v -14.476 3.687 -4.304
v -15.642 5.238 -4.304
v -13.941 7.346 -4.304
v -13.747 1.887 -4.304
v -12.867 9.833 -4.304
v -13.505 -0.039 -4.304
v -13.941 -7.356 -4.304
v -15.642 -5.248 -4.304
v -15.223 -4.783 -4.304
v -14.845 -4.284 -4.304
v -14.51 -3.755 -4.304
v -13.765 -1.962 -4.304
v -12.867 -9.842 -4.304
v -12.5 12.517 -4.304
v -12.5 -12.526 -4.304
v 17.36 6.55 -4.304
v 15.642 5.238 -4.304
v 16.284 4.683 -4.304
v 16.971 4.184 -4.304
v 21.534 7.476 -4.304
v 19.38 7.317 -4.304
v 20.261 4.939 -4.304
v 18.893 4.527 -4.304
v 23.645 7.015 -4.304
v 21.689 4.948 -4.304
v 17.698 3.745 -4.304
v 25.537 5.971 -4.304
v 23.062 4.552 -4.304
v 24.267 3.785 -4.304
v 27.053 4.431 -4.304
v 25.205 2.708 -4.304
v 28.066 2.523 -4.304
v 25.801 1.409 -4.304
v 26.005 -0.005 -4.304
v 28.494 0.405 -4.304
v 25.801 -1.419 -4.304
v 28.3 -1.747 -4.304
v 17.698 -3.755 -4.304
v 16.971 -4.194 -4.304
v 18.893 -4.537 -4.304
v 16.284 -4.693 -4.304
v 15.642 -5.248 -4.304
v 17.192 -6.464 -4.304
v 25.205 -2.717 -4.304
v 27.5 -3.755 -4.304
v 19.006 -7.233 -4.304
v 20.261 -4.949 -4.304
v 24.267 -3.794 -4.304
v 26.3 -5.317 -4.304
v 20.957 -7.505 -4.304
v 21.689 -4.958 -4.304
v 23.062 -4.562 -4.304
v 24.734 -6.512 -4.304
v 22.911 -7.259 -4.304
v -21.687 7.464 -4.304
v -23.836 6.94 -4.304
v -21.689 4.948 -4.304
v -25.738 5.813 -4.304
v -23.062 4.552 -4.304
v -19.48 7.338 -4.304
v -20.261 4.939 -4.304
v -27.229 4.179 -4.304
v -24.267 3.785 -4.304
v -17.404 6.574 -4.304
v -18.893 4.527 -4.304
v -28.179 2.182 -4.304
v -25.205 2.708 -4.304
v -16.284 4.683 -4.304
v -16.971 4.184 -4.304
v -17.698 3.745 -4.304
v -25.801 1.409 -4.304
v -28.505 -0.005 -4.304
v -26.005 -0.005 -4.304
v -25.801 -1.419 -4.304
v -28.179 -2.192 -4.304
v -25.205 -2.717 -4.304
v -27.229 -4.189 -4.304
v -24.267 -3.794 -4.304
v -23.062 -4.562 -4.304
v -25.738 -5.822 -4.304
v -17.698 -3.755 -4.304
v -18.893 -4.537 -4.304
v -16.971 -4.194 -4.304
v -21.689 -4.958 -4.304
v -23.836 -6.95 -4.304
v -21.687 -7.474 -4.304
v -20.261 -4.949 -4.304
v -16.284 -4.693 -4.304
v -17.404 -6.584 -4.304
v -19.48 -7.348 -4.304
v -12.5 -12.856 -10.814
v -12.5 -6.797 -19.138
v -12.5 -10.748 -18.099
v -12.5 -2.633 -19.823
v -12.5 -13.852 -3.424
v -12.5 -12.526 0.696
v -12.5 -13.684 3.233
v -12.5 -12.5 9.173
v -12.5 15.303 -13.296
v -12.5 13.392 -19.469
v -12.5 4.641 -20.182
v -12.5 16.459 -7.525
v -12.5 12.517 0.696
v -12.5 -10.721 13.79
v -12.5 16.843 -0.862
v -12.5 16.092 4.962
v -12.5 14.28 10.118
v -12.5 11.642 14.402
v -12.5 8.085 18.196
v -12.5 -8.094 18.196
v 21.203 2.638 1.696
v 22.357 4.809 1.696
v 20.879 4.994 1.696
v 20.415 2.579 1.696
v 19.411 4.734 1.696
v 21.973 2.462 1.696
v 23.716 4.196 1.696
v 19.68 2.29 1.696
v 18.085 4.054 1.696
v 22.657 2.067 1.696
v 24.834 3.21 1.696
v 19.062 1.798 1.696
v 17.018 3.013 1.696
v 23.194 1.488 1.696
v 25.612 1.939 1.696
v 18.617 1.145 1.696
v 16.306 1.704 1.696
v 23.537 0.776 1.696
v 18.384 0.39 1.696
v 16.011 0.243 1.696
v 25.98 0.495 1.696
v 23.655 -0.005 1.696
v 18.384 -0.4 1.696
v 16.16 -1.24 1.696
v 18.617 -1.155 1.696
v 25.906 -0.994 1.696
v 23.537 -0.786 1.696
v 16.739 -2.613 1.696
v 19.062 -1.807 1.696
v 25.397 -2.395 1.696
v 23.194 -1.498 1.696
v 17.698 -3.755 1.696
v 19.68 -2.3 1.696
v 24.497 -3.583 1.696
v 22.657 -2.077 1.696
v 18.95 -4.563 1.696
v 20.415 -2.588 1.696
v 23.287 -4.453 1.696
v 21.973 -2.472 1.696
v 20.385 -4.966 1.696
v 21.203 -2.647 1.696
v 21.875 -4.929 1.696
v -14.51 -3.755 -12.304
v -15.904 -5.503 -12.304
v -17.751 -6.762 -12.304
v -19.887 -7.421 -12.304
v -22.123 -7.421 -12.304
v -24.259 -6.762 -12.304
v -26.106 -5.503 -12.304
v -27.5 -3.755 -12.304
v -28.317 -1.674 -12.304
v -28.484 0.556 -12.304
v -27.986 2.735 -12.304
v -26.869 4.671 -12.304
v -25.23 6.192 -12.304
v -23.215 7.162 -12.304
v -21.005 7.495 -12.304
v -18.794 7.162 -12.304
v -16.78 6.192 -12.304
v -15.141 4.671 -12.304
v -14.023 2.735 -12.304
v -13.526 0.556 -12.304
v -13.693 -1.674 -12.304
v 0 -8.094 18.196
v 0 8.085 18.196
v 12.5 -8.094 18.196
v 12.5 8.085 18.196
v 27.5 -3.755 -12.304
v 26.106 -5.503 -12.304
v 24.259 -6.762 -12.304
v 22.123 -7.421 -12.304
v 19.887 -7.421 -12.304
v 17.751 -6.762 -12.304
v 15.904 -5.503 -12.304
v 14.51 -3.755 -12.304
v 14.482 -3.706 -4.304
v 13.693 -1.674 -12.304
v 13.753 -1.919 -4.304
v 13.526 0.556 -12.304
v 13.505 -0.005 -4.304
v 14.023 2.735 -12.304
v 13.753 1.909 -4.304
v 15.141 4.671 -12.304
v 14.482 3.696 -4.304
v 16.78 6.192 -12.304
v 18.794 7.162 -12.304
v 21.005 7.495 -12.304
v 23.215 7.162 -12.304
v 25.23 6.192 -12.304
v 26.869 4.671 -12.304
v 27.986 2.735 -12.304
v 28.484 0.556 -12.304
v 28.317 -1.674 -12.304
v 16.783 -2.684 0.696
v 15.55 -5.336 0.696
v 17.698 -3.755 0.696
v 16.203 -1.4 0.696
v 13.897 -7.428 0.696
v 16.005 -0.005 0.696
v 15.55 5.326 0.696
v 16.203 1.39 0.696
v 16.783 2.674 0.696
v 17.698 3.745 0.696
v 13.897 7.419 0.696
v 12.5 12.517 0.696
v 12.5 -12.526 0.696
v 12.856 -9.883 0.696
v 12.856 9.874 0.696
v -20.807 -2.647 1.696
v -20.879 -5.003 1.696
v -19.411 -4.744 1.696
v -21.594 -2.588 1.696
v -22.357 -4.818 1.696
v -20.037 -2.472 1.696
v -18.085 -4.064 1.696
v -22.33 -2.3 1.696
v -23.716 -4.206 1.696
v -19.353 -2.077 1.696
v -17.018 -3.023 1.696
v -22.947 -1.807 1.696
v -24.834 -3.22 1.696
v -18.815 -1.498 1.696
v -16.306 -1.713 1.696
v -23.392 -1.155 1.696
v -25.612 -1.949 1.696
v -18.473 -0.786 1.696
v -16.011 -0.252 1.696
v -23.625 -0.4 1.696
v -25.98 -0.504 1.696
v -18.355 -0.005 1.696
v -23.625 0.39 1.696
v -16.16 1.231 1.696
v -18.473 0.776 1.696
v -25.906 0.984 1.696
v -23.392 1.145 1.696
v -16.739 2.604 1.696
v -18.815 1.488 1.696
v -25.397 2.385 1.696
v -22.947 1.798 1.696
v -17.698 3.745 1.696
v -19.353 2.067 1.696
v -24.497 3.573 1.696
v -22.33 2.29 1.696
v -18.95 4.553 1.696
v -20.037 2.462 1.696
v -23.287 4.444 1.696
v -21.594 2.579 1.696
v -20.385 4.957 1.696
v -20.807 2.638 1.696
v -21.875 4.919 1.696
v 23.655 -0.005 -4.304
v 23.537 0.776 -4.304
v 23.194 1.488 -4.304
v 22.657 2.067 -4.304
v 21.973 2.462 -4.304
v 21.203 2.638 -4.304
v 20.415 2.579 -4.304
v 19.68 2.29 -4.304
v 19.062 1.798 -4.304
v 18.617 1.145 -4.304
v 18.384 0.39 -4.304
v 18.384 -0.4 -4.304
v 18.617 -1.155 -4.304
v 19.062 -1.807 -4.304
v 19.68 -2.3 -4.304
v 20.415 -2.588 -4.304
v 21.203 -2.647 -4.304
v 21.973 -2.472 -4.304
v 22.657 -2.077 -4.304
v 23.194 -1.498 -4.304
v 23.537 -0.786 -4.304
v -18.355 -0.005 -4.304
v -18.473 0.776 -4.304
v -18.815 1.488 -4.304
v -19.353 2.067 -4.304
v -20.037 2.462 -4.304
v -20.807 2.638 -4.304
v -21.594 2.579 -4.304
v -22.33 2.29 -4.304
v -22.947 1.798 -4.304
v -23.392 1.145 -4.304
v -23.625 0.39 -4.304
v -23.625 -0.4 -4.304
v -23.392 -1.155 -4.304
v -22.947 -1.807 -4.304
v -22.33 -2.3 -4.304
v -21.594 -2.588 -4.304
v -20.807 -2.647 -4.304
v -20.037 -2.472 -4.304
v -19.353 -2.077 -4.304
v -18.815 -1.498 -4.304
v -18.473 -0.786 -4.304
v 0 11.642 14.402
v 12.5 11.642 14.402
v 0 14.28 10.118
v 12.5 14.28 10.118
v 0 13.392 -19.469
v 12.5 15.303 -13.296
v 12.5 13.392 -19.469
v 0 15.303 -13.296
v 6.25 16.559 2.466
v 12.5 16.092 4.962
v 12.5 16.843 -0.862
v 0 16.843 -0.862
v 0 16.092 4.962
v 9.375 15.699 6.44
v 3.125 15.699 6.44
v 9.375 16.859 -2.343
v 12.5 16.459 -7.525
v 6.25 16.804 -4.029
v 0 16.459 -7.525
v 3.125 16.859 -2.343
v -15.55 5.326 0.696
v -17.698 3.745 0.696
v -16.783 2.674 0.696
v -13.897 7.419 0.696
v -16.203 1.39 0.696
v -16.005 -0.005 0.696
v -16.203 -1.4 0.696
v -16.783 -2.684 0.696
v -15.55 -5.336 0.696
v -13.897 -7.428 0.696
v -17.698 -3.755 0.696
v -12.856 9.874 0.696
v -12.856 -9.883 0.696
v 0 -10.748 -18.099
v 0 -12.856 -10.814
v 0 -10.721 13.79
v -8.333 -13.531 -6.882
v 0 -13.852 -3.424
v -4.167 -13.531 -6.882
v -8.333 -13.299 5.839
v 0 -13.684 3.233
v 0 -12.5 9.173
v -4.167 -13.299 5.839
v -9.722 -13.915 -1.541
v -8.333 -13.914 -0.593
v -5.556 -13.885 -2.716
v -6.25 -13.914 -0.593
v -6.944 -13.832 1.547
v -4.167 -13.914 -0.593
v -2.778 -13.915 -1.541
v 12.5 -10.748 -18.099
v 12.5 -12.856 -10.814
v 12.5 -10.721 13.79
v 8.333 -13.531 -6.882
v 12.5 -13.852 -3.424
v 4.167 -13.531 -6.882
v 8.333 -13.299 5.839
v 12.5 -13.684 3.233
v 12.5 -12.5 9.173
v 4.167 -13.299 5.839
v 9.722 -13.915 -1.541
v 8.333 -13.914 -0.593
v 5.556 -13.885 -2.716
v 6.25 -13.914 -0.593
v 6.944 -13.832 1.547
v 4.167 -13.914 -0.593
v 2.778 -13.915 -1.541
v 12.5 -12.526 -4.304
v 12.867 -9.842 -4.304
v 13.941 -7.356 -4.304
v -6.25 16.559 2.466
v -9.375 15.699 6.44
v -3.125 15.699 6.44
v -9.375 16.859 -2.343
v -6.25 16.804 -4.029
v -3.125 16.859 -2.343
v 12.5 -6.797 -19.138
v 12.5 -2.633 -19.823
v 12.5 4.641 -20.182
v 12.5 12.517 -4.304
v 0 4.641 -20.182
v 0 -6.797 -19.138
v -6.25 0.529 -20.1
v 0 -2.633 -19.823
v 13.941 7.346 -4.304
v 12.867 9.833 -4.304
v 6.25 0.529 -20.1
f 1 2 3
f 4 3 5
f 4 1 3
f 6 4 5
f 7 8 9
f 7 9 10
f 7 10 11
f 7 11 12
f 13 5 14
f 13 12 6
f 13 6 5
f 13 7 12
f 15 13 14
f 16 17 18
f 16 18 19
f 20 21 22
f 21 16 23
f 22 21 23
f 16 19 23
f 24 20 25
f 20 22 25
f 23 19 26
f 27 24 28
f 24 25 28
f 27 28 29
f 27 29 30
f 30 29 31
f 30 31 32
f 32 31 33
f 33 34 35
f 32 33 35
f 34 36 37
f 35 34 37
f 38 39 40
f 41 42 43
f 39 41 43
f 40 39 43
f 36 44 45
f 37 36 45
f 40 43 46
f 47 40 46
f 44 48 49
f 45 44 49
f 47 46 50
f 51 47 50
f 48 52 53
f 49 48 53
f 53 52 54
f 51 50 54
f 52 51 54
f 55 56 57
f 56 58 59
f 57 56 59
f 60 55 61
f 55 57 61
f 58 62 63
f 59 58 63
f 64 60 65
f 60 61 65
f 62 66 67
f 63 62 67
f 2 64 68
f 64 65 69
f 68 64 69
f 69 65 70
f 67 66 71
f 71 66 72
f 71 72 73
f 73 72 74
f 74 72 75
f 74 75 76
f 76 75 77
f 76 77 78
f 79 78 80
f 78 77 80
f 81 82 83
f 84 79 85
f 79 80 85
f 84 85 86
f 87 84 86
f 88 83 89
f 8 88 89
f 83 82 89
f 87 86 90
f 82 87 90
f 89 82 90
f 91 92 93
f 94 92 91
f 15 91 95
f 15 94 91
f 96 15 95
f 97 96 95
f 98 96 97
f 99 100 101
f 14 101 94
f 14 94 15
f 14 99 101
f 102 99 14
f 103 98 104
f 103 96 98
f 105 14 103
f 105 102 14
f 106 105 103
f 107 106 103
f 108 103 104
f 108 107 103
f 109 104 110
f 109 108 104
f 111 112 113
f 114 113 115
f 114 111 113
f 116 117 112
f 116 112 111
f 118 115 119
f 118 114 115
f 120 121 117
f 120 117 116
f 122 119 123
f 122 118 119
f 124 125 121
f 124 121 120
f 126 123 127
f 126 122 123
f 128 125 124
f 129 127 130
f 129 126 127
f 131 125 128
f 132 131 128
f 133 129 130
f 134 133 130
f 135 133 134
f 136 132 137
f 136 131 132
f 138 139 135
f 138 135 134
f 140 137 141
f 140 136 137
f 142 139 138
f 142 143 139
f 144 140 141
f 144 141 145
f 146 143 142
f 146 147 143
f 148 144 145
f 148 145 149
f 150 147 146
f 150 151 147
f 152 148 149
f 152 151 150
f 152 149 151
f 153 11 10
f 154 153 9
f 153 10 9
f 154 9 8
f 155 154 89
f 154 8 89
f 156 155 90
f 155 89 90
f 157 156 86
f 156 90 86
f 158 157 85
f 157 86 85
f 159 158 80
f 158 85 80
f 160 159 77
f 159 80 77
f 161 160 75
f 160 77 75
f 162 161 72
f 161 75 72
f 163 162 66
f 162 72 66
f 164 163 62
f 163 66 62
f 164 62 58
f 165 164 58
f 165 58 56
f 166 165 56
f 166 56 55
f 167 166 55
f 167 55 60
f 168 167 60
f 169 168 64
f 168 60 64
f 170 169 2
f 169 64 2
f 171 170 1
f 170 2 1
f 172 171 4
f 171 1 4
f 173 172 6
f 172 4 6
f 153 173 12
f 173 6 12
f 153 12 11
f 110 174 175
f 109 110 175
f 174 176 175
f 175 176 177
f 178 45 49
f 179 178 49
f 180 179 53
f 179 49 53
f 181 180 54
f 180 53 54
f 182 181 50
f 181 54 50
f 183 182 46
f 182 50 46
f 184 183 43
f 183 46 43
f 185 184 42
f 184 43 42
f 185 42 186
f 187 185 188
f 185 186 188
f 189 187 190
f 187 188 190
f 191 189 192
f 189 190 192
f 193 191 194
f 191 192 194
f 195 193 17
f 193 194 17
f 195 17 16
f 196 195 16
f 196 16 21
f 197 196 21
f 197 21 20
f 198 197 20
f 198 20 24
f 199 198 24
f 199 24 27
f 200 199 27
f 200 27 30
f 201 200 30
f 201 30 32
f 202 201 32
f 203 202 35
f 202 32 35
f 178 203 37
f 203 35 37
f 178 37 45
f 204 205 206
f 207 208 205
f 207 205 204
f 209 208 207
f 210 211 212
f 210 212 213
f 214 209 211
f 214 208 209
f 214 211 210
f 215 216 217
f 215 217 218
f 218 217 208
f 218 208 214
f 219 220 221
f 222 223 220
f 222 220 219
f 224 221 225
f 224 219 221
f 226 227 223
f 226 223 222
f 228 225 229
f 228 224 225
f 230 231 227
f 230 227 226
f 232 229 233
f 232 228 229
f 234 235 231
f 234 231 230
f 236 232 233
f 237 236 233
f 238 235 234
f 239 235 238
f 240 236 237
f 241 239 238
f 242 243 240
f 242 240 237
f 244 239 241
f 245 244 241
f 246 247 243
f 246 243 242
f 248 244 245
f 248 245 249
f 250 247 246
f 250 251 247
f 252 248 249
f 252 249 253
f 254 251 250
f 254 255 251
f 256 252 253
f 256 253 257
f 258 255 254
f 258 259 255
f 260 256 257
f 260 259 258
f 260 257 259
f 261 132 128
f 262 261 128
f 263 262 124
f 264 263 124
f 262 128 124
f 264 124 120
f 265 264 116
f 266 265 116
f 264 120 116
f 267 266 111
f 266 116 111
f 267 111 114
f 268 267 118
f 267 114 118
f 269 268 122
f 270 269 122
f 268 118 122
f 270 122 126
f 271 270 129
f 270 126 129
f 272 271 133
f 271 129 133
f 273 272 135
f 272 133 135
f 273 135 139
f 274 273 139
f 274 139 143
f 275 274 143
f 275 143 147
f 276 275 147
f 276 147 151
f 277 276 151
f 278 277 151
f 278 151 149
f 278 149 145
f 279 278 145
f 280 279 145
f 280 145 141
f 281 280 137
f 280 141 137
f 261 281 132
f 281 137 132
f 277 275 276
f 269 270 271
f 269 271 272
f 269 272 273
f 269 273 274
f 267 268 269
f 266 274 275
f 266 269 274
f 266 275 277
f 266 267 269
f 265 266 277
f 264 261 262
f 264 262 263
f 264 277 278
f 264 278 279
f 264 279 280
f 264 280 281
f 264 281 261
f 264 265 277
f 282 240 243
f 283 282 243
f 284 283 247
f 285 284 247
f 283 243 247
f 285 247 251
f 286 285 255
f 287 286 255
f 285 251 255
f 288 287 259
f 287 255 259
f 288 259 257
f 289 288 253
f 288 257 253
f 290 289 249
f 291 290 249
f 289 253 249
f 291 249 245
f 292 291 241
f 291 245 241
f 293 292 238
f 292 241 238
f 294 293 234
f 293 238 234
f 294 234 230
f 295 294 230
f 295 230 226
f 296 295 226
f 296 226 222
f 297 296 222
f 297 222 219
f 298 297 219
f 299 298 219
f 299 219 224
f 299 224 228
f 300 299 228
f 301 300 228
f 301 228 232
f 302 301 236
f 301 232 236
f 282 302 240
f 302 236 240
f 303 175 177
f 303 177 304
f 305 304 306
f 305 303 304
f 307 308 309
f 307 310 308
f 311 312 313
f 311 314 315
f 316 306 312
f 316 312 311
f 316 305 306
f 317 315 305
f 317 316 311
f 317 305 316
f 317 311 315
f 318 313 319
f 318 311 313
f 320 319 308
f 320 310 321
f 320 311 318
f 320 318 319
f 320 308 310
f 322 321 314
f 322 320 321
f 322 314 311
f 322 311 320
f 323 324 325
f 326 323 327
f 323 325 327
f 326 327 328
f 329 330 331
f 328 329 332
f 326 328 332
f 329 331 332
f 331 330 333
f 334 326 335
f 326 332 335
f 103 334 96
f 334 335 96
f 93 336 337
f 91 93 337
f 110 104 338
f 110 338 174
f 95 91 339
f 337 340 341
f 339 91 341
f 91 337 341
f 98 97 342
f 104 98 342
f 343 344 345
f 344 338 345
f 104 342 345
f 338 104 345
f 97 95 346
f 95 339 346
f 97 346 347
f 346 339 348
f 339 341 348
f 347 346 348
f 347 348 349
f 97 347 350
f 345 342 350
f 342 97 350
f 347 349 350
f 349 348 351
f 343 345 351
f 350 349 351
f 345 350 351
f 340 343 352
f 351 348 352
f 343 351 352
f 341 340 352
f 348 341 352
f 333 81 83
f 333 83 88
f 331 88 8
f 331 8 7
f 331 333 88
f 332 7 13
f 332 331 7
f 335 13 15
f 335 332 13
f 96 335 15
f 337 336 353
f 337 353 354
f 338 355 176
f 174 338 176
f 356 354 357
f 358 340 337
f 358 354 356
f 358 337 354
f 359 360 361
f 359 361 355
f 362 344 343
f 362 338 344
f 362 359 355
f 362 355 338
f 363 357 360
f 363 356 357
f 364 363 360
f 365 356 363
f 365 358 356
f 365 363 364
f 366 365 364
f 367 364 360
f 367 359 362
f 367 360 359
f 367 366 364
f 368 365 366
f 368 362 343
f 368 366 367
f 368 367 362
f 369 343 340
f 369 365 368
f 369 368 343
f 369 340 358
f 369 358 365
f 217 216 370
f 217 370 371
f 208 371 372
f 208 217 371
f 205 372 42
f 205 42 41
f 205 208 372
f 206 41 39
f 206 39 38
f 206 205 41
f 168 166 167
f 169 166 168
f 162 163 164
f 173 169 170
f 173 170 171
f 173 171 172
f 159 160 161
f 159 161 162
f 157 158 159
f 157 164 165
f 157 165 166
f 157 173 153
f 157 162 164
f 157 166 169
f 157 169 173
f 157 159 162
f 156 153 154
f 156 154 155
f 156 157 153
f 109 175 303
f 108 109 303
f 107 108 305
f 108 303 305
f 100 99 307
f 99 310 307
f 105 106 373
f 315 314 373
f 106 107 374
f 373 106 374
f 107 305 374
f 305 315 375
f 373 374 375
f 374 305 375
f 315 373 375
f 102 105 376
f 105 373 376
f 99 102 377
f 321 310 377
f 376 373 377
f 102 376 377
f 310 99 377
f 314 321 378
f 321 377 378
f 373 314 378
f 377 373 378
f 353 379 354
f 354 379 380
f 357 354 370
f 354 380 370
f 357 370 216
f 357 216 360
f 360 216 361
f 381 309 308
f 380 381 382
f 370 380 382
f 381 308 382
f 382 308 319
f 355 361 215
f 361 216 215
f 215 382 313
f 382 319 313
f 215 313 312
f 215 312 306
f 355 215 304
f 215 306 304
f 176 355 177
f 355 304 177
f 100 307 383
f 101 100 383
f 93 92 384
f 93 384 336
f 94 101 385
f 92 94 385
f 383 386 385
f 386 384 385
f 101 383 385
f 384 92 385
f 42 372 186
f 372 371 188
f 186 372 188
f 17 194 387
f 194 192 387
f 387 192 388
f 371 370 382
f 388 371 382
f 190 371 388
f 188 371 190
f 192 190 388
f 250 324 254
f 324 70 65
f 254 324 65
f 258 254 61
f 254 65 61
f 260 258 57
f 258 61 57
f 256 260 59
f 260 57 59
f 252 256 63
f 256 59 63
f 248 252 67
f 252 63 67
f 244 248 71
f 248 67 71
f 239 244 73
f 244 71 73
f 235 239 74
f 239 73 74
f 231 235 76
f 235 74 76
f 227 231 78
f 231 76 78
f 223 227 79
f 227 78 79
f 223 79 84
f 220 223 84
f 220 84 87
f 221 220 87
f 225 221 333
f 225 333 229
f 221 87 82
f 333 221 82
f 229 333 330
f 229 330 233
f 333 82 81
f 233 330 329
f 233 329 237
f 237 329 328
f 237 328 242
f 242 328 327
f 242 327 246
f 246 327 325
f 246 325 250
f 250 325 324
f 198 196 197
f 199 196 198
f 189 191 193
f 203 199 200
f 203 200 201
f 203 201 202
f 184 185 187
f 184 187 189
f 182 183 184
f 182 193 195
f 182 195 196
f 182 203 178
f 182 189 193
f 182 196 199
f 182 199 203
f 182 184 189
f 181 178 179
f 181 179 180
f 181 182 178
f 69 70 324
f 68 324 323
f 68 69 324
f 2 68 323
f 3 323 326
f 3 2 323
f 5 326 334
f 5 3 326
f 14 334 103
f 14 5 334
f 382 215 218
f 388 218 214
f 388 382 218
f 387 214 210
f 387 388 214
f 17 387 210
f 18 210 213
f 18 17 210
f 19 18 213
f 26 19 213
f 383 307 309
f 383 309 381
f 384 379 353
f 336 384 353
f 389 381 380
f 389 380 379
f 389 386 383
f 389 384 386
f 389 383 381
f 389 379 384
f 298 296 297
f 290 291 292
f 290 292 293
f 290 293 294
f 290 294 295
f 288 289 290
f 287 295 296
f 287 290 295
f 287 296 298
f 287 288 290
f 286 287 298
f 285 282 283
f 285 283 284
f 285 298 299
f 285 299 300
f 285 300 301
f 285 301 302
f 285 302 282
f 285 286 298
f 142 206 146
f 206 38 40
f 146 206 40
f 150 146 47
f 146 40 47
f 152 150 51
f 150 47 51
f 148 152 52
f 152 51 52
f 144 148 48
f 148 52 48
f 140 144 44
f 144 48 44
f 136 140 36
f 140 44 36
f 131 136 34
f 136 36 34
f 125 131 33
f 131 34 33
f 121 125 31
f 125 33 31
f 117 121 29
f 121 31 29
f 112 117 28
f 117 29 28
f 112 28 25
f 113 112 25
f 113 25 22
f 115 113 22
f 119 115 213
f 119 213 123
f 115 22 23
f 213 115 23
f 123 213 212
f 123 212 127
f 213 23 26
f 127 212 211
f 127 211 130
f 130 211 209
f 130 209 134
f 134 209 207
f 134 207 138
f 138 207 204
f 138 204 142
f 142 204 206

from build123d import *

# Parameters (mm, degrees)
BOSS_EXTRUDE1_DEPTH = 12.5
SKETCH3_W           = 5
SKETCH3_H           = 7.5
BOSS_EXTRUDE2_DEPTH = 27.5
SKETCH4_R           = 7.5
BOSS_EXTRUDE3_DEPTH = 8
SKETCH5_W           = 10.105162594
SKETCH5_H           = 17.406531809
CUT_EXTRUDE1_DEPTH  = 151.624338723
SKETCH6_R           = 5
BOSS_EXTRUDE4_DEPTH = 6
FILLET1_R           = 10
SKETCH7_R           = 2.65
CUT_EXTRUDE2_DEPTH  = 6


with BuildPart() as part:
    # Sketch1 → Boss-Extrude1 (new, symmetric)
    with BuildSketch(Plane(origin=(0, 0, 0), x_dir=(0, 0, -1), z_dir=(1, 0, 0))):
        with BuildLine():
            Line((-19.096184677, 121.225789304), (-19.096184677, 137.404518888))
            add(Edge.make_bspline(
                [(-19.096184677, 137.404518888), (-6.467464955, 151.699126132), (18.56858261, 142.711827006)],
                knots=[0, 0, 0, 1, 1, 1], degree=2))
            add(Edge.make_bspline(
                [(18.56858261, 142.711827006), (20.515458249, 129.056565793), (17.198954708, 118.572135245)],
                knots=[0, 0, 0, 1, 1, 1], degree=2))
            add(Edge.make_bspline(
                [(17.198954708, 118.572135245), (7.355214534, 114.934231268), (-7.542469836, 112.881439696), (-19.096184677, 121.225789304)],
                knots=[0, 0, 0, 0, 1, 1, 1, 1], degree=3))
        make_face()
    extrude(amount=BOSS_EXTRUDE1_DEPTH, both=True)

    # Sketch3 → Boss-Extrude2 (add, symmetric)
    with BuildSketch(Plane(origin=(0, 0, 0), x_dir=(0, 0, -1), z_dir=(1, 0, 0))):
        with Locations((0.903815323, 129.315154096)):
            Rectangle(SKETCH3_W, SKETCH3_H)
    extrude(amount=BOSS_EXTRUDE2_DEPTH, both=True)

    # Sketch4 → Boss-Extrude3 (add)
    with BuildSketch(Plane(origin=(0, 0, -3.403815323), x_dir=(-1, 0, 0), z_dir=(0, 0, -1))):
        with Locations(Location((-21.004809472, 129.315154096, 0), (0, 0, 210))):
            Circle(SKETCH4_R)
        with Locations(Location((21.004809472, 129.315154096, 0), (0, 0, 210))):
            Circle(SKETCH4_R)
    extrude(amount=BOSS_EXTRUDE3_DEPTH)

    # Sketch5 → Cut-Extrude1 (cut, through all)
    with BuildSketch(Plane.XY.offset(-3.403815323)):
        with Locations((-26.057390769, 128.111888192)):
            Rectangle(SKETCH5_W, SKETCH5_H)
        with Locations((26.057390769, 128.111888192)):
            Rectangle(SKETCH5_W, SKETCH5_H)
    extrude(amount=CUT_EXTRUDE1_DEPTH, mode=Mode.SUBTRACT)

    # Sketch6 → Boss-Extrude4 (add)
    with BuildSketch(Plane.XY.offset(-3.403815323)):
        with Locations(Location((21.004809472, 129.315154096, 0), (0, 0, 228.590377891))):
            Circle(SKETCH6_R)
        with Locations(Location((-21.004809472, 129.315154096, 0), (0, 0, 48.590377891))):
            Circle(SKETCH6_R)
    extrude(amount=BOSS_EXTRUDE4_DEPTH)

    # Fillet1
    # the kernel refuses this fillet: 10 mm, written as the material it adds along each edge
    with BuildSketch(Plane(origin=(12.5, 125.565154096, 1.596184677), x_dir=(0, -1, 0), z_dir=(0, 0, -1)), Plane(origin=(12.5, 133.065154096, -3.403815323), x_dir=(0, 1, 0), z_dir=(0, 0, 1))) as fillet1_piece_1:
        with BuildLine():
            CenterArc((8.771382419, -10), FILLET1_R, 90, 61.299054853)
            Line((0, -5.197620333), (0, 0))
            Line((0, 0), (8.771382419, 0))
        make_face()
    extrude(amount=5)
    with BuildSketch(Plane(origin=(-12.5, 133.065154096, -3.403815323), x_dir=(0, 1, 0), z_dir=(0, 0, 1)), Plane(origin=(-12.5, 125.565154096, 1.596184677), x_dir=(0, -1, 0), z_dir=(0, 0, -1))) as fillet1_piece_2:
        with BuildLine():
            CenterArc((8.771382419, 10), FILLET1_R, 208.700945147, 61.299054853)
            Line((0, 5.197620333), (0, 0))
            Line((0, 0), (8.771382419, 0))
        make_face()
    extrude(amount=5)

    # Sketch7 → Cut-Extrude2 (cut)
    with BuildSketch(Plane.XY.offset(2.596184677)):
        with Locations((21.004809472, 129.315154096)):
            Circle(SKETCH7_R)
        with Locations((-21.004809472, 129.315154096)):
            Circle(SKETCH7_R)
    extrude(amount=-CUT_EXTRUDE2_DEPTH, mode=Mode.SUBTRACT)


with BuildPart() as part_1:
    # Body-Move/Copy1: moved
    add(part.part.moved(Location((0, -129.32, -0.9))))


solid = part_1.part
